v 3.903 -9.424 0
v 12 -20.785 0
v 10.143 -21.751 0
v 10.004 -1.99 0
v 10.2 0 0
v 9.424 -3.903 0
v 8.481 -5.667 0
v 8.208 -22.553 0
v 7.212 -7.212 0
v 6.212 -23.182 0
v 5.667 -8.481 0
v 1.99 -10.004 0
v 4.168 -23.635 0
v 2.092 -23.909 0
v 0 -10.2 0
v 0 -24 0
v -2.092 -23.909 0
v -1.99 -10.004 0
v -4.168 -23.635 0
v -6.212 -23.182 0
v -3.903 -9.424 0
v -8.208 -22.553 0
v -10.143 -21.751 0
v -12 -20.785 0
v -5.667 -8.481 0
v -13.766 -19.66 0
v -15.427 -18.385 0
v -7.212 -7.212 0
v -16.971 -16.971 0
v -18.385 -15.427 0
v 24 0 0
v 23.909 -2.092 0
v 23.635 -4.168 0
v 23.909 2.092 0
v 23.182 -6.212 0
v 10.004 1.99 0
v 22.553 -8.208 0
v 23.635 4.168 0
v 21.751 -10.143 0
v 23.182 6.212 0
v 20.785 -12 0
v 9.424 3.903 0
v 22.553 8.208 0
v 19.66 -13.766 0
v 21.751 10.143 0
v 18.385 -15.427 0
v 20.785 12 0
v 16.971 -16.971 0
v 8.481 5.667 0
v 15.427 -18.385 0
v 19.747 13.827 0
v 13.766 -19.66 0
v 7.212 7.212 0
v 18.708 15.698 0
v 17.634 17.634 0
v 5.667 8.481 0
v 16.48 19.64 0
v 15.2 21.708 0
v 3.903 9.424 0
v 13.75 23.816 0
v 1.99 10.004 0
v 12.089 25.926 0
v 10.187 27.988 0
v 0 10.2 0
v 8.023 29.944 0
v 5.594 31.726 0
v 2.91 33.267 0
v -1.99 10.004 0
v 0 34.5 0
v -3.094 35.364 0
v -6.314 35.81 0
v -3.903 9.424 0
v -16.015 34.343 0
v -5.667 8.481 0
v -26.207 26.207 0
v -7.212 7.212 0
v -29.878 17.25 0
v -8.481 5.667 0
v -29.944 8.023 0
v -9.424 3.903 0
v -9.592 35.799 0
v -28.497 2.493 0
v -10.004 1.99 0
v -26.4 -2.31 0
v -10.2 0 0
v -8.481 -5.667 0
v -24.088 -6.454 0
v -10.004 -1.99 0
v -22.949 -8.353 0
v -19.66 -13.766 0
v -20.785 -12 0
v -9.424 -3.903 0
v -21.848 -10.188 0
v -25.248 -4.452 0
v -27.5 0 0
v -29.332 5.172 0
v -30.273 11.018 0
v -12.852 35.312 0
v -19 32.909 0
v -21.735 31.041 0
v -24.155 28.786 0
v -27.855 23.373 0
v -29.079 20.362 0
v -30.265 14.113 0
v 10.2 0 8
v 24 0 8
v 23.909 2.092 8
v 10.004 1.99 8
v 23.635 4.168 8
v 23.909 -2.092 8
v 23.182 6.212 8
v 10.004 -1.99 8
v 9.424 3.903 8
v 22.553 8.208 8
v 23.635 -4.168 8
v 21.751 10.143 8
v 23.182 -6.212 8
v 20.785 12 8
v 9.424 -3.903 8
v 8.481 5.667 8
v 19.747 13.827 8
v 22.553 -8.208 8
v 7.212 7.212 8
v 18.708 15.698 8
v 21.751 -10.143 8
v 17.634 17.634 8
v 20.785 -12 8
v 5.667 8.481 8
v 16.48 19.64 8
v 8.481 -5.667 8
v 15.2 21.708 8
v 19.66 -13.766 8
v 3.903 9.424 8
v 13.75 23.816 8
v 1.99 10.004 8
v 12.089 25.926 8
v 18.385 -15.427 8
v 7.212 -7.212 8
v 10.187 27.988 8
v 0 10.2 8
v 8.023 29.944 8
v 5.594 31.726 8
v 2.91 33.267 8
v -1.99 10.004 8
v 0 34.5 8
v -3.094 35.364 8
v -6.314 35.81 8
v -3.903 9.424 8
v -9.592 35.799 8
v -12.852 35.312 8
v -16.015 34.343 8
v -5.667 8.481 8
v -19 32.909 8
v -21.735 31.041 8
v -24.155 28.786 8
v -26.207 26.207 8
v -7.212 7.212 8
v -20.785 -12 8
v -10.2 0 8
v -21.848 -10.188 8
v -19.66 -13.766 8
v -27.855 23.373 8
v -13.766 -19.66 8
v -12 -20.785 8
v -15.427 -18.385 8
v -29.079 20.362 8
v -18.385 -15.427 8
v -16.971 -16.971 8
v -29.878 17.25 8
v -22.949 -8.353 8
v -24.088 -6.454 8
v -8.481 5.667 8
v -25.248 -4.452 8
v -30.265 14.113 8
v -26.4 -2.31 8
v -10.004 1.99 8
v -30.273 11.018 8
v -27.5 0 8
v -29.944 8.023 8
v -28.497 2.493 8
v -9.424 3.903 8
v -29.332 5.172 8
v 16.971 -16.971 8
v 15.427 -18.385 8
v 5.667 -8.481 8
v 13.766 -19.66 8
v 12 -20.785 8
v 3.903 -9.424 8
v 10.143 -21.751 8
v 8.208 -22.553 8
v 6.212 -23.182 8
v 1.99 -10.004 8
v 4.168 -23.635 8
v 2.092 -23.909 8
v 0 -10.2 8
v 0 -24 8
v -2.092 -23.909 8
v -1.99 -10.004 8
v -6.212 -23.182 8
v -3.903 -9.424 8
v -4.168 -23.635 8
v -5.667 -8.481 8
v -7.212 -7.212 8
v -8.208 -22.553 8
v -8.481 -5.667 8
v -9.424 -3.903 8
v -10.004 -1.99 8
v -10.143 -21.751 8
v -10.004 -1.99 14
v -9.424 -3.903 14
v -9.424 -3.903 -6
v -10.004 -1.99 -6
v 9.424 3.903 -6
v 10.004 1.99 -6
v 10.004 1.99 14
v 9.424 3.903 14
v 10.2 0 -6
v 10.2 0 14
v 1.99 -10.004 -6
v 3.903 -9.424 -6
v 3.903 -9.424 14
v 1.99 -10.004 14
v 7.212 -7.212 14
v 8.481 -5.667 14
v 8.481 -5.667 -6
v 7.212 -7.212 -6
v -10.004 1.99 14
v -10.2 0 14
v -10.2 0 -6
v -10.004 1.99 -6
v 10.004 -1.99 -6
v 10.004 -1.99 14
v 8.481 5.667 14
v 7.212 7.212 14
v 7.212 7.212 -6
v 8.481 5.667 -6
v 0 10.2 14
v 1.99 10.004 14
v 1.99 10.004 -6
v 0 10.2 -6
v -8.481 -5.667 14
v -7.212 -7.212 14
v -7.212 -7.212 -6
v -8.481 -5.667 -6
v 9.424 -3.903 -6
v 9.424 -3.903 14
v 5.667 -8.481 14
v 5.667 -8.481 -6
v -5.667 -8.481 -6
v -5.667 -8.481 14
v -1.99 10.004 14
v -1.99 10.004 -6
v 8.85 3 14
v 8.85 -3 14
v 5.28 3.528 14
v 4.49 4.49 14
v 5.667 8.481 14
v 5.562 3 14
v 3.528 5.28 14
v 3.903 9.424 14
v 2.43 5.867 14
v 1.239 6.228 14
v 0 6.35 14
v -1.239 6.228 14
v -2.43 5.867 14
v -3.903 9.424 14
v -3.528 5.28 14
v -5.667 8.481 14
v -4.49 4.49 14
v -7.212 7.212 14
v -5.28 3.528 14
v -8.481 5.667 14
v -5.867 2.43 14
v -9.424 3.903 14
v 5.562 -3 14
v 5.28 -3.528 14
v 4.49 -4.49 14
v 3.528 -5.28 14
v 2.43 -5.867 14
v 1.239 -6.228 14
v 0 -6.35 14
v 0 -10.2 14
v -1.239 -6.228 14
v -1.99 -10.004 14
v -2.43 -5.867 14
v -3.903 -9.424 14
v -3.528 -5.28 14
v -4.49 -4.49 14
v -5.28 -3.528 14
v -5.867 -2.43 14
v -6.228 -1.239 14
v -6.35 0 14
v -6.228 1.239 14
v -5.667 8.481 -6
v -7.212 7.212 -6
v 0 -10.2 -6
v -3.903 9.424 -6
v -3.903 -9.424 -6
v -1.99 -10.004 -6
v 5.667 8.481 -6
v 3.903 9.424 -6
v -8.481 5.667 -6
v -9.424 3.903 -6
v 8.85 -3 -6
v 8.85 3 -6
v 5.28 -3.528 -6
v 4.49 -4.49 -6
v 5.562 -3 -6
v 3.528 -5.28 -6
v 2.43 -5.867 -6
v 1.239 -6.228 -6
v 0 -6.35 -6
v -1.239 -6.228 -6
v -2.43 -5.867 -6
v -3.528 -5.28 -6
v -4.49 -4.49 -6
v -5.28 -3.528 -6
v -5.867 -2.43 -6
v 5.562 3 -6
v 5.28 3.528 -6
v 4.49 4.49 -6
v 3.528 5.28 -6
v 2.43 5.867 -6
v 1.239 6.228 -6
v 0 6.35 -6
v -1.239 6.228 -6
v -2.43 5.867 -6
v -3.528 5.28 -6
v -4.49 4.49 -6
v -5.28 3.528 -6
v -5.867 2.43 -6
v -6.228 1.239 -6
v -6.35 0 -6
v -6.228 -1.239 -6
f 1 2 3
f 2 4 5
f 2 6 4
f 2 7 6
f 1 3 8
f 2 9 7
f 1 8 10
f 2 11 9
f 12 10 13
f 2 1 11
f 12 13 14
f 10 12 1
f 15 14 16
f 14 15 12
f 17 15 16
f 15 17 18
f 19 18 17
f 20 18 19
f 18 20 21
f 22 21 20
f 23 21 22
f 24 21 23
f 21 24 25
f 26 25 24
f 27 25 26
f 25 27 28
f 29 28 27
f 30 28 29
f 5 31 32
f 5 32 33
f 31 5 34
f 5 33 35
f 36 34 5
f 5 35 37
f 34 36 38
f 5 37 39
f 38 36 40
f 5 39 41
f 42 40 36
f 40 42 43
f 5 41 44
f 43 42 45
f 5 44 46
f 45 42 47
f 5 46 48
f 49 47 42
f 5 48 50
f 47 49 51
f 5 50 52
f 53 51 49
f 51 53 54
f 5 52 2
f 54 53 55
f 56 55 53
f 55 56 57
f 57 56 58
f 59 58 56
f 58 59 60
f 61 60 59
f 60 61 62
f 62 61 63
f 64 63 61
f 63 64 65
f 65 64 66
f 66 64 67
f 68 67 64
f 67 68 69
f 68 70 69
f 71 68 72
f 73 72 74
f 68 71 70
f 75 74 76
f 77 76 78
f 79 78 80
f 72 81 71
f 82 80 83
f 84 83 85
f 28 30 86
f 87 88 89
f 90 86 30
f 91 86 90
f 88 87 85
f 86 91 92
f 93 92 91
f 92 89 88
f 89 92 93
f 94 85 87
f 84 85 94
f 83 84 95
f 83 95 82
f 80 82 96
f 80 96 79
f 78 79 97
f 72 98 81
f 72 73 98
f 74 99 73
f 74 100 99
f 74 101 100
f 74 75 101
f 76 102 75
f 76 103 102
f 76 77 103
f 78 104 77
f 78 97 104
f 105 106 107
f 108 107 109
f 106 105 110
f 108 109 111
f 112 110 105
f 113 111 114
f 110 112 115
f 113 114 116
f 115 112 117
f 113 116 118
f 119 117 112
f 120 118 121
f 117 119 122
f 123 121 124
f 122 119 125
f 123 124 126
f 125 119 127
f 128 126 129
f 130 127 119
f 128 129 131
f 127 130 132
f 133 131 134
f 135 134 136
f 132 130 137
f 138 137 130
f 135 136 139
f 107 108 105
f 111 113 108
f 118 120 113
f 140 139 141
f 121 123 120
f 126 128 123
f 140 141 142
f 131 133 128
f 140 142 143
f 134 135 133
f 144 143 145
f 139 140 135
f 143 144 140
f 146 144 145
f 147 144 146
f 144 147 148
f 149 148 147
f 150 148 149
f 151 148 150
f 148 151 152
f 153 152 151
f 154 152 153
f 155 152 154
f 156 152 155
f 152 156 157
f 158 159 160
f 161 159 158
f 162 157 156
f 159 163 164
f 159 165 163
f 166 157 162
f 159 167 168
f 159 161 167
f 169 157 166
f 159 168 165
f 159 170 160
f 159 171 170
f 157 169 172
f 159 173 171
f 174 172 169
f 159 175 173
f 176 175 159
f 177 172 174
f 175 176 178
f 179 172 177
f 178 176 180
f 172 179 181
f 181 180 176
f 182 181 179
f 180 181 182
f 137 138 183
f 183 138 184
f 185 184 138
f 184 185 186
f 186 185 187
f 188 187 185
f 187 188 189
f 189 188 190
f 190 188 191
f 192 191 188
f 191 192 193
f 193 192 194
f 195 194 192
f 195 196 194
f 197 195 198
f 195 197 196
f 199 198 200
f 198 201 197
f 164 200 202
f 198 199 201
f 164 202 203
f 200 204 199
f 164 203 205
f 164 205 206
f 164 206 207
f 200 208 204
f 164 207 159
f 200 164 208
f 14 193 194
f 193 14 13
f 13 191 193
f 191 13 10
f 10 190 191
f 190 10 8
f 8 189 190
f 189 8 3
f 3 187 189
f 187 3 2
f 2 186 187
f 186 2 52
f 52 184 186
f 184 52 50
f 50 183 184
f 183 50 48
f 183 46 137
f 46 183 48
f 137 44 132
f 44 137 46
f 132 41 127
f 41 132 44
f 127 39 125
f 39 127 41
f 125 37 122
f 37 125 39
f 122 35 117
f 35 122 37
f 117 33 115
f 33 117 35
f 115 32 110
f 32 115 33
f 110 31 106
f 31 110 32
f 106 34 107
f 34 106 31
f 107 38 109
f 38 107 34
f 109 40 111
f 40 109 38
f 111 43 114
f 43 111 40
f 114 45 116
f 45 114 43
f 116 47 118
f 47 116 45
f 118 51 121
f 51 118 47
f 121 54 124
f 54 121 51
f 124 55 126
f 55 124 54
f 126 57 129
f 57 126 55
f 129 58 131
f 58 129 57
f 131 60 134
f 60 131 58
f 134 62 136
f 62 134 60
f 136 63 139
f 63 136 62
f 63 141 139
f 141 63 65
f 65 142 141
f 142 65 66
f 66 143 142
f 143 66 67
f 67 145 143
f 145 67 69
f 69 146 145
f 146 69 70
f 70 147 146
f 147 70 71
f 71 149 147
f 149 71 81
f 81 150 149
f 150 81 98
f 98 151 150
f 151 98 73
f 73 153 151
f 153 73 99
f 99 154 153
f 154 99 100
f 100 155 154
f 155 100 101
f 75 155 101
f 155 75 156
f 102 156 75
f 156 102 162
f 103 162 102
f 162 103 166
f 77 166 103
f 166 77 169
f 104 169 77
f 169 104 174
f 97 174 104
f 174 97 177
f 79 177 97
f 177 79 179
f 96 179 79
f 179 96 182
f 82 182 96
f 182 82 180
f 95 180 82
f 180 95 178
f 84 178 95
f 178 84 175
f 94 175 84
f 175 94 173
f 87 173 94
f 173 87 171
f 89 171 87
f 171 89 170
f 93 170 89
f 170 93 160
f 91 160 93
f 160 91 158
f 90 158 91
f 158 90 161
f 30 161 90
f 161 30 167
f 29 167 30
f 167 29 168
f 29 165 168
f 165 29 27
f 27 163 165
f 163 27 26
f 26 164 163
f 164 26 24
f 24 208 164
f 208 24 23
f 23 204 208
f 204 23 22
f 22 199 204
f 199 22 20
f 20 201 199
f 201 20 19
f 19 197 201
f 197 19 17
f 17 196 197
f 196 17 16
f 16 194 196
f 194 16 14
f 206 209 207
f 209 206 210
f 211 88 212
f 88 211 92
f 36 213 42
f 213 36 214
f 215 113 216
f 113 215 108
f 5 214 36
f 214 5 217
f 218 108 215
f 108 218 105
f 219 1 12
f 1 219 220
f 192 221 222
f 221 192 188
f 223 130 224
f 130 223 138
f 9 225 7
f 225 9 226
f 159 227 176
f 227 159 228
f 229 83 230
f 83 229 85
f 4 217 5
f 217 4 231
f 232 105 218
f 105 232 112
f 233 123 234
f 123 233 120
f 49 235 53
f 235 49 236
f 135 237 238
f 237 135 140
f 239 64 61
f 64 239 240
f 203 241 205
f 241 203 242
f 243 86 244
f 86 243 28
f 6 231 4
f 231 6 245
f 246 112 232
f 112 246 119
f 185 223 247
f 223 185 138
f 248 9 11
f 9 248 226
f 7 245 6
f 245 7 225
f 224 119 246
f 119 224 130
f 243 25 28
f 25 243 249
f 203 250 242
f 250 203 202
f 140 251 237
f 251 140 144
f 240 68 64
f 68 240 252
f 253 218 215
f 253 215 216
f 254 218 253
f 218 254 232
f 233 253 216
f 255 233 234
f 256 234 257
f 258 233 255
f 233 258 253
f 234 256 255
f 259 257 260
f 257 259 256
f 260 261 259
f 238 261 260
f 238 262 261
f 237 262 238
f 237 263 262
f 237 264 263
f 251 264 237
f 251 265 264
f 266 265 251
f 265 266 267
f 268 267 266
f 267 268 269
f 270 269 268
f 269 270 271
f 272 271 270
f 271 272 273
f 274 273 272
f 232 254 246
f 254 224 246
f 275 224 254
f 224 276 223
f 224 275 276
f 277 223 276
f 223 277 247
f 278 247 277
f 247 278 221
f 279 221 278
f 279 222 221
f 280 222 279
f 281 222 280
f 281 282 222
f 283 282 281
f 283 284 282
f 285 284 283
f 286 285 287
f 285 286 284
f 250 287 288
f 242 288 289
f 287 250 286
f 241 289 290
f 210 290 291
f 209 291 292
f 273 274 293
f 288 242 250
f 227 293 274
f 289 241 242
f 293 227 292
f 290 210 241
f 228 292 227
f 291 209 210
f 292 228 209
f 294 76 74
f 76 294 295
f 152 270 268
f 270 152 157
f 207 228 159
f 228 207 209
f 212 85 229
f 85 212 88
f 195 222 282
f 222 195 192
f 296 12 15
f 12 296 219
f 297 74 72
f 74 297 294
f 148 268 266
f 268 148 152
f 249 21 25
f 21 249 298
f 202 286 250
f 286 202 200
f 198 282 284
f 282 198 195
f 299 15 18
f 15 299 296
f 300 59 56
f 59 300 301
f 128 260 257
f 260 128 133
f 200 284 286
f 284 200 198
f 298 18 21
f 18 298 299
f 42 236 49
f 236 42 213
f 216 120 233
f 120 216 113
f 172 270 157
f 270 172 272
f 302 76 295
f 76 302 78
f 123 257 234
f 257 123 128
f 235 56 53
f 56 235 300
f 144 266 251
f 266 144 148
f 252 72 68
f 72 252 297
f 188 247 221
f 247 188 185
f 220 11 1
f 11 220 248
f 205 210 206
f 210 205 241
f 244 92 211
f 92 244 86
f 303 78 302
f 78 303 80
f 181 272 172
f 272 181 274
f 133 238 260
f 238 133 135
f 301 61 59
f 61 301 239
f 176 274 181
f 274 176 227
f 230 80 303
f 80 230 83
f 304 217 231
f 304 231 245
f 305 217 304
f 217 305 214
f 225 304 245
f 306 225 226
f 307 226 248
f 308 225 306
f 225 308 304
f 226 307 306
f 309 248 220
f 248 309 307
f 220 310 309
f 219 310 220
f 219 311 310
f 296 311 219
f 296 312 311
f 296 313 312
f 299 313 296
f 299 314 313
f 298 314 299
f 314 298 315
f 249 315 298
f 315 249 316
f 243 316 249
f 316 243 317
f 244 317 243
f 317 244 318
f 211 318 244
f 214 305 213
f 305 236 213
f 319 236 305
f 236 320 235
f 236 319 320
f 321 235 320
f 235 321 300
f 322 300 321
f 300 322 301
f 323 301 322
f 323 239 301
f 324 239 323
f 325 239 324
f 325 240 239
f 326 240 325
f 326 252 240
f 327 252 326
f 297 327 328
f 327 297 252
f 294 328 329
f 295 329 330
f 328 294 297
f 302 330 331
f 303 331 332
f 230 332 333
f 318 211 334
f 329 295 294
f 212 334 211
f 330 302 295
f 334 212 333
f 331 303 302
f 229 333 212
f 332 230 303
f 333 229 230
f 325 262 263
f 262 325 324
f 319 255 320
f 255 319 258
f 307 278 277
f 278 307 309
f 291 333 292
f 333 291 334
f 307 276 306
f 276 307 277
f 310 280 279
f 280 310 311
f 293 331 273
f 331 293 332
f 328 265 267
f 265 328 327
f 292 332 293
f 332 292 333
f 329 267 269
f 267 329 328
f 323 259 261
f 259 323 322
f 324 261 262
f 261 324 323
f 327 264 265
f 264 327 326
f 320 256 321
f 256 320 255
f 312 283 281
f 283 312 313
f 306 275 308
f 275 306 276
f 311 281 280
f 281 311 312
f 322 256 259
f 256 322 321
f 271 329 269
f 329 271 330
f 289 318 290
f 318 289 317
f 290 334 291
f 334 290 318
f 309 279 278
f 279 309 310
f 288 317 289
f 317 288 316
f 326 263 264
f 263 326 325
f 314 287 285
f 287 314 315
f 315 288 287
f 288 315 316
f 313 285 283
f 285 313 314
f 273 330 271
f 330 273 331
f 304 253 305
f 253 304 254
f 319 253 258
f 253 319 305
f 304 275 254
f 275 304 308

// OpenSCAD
$fn = 32;

// ----------------------------------------------------------------------
// Cam: base radius 24 mm with a 14 mm lift over 180 degrees
// ----------------------------------------------------------------------

// --- parameters (mm) ---
base_r = 24;              // base radius
lift = 14;                // lift height above the base radius
lift_span = 180;          // angular width of the lift
lift_start = 30;          // angle where the lift starts
cam_t = 8;                // cam plate thickness
hub_d = 20.4;             // hub diameter
hub_h = 20;               // hub height
bore_d = 12.7;            // bore
key_w = 6;                // keyway width
key_depth = 1.85;         // keyway depth

cam_profile = [[24, 0], [23.909, 2.092], [23.635, 4.168], [23.182, 6.212], [22.553, 8.208], [21.751, 10.143], [20.785, 12], [19.747, 13.827], [18.708, 15.698], [17.634, 17.634], [16.48, 19.64], [15.2, 21.708], [13.75, 23.816], [12.089, 25.926], [10.187, 27.988], [8.023, 29.944], [5.594, 31.726], [2.91, 33.267], [0, 34.5], [-3.094, 35.364], [-6.314, 35.81], [-9.592, 35.799], [-12.852, 35.312], [-16.015, 34.343], [-19, 32.909], [-21.735, 31.041], [-24.155, 28.786], [-26.207, 26.207], [-27.855, 23.373], [-29.079, 20.362], [-29.878, 17.25], [-30.265, 14.113], [-30.273, 11.018], [-29.944, 8.023], [-29.332, 5.172], [-28.497, 2.493], [-27.5, 0], [-26.4, -2.31], [-25.248, -4.452], [-24.088, -6.454], [-22.949, -8.353], [-21.848, -10.188], [-20.785, -12], [-19.66, -13.766], [-18.385, -15.427], [-16.971, -16.971], [-15.427, -18.385], [-13.766, -19.66], [-12, -20.785], [-10.143, -21.751], [-8.208, -22.553], [-6.212, -23.182], [-4.168, -23.635], [-2.092, -23.909], [0, -24], [2.092, -23.909], [4.168, -23.635], [6.212, -23.182], [8.208, -22.553], [10.143, -21.751], [12, -20.785], [13.766, -19.66], [15.427, -18.385], [16.971, -16.971], [18.385, -15.427], [19.66, -13.766], [20.785, -12], [21.751, -10.143], [22.553, -8.208], [23.182, -6.212], [23.635, -4.168], [23.909, -2.092]];

difference() {
  union() {
    linear_extrude(height = cam_t) polygon(cam_profile);
    /* hub, proud of the cam plate on both sides */
    translate([0, 0, -6]) cylinder(h = hub_h, d = hub_d);
  }
  /* bore through the hub, 2.5 mm clear on both faces */
  translate([0, 0, -8.5]) cylinder(h = hub_h + 5, d = bore_d);
  /* keyway, milled through the whole hub */
  translate([4.5, -3, -8.5]) cube([4.35, 6, 25]);
}
